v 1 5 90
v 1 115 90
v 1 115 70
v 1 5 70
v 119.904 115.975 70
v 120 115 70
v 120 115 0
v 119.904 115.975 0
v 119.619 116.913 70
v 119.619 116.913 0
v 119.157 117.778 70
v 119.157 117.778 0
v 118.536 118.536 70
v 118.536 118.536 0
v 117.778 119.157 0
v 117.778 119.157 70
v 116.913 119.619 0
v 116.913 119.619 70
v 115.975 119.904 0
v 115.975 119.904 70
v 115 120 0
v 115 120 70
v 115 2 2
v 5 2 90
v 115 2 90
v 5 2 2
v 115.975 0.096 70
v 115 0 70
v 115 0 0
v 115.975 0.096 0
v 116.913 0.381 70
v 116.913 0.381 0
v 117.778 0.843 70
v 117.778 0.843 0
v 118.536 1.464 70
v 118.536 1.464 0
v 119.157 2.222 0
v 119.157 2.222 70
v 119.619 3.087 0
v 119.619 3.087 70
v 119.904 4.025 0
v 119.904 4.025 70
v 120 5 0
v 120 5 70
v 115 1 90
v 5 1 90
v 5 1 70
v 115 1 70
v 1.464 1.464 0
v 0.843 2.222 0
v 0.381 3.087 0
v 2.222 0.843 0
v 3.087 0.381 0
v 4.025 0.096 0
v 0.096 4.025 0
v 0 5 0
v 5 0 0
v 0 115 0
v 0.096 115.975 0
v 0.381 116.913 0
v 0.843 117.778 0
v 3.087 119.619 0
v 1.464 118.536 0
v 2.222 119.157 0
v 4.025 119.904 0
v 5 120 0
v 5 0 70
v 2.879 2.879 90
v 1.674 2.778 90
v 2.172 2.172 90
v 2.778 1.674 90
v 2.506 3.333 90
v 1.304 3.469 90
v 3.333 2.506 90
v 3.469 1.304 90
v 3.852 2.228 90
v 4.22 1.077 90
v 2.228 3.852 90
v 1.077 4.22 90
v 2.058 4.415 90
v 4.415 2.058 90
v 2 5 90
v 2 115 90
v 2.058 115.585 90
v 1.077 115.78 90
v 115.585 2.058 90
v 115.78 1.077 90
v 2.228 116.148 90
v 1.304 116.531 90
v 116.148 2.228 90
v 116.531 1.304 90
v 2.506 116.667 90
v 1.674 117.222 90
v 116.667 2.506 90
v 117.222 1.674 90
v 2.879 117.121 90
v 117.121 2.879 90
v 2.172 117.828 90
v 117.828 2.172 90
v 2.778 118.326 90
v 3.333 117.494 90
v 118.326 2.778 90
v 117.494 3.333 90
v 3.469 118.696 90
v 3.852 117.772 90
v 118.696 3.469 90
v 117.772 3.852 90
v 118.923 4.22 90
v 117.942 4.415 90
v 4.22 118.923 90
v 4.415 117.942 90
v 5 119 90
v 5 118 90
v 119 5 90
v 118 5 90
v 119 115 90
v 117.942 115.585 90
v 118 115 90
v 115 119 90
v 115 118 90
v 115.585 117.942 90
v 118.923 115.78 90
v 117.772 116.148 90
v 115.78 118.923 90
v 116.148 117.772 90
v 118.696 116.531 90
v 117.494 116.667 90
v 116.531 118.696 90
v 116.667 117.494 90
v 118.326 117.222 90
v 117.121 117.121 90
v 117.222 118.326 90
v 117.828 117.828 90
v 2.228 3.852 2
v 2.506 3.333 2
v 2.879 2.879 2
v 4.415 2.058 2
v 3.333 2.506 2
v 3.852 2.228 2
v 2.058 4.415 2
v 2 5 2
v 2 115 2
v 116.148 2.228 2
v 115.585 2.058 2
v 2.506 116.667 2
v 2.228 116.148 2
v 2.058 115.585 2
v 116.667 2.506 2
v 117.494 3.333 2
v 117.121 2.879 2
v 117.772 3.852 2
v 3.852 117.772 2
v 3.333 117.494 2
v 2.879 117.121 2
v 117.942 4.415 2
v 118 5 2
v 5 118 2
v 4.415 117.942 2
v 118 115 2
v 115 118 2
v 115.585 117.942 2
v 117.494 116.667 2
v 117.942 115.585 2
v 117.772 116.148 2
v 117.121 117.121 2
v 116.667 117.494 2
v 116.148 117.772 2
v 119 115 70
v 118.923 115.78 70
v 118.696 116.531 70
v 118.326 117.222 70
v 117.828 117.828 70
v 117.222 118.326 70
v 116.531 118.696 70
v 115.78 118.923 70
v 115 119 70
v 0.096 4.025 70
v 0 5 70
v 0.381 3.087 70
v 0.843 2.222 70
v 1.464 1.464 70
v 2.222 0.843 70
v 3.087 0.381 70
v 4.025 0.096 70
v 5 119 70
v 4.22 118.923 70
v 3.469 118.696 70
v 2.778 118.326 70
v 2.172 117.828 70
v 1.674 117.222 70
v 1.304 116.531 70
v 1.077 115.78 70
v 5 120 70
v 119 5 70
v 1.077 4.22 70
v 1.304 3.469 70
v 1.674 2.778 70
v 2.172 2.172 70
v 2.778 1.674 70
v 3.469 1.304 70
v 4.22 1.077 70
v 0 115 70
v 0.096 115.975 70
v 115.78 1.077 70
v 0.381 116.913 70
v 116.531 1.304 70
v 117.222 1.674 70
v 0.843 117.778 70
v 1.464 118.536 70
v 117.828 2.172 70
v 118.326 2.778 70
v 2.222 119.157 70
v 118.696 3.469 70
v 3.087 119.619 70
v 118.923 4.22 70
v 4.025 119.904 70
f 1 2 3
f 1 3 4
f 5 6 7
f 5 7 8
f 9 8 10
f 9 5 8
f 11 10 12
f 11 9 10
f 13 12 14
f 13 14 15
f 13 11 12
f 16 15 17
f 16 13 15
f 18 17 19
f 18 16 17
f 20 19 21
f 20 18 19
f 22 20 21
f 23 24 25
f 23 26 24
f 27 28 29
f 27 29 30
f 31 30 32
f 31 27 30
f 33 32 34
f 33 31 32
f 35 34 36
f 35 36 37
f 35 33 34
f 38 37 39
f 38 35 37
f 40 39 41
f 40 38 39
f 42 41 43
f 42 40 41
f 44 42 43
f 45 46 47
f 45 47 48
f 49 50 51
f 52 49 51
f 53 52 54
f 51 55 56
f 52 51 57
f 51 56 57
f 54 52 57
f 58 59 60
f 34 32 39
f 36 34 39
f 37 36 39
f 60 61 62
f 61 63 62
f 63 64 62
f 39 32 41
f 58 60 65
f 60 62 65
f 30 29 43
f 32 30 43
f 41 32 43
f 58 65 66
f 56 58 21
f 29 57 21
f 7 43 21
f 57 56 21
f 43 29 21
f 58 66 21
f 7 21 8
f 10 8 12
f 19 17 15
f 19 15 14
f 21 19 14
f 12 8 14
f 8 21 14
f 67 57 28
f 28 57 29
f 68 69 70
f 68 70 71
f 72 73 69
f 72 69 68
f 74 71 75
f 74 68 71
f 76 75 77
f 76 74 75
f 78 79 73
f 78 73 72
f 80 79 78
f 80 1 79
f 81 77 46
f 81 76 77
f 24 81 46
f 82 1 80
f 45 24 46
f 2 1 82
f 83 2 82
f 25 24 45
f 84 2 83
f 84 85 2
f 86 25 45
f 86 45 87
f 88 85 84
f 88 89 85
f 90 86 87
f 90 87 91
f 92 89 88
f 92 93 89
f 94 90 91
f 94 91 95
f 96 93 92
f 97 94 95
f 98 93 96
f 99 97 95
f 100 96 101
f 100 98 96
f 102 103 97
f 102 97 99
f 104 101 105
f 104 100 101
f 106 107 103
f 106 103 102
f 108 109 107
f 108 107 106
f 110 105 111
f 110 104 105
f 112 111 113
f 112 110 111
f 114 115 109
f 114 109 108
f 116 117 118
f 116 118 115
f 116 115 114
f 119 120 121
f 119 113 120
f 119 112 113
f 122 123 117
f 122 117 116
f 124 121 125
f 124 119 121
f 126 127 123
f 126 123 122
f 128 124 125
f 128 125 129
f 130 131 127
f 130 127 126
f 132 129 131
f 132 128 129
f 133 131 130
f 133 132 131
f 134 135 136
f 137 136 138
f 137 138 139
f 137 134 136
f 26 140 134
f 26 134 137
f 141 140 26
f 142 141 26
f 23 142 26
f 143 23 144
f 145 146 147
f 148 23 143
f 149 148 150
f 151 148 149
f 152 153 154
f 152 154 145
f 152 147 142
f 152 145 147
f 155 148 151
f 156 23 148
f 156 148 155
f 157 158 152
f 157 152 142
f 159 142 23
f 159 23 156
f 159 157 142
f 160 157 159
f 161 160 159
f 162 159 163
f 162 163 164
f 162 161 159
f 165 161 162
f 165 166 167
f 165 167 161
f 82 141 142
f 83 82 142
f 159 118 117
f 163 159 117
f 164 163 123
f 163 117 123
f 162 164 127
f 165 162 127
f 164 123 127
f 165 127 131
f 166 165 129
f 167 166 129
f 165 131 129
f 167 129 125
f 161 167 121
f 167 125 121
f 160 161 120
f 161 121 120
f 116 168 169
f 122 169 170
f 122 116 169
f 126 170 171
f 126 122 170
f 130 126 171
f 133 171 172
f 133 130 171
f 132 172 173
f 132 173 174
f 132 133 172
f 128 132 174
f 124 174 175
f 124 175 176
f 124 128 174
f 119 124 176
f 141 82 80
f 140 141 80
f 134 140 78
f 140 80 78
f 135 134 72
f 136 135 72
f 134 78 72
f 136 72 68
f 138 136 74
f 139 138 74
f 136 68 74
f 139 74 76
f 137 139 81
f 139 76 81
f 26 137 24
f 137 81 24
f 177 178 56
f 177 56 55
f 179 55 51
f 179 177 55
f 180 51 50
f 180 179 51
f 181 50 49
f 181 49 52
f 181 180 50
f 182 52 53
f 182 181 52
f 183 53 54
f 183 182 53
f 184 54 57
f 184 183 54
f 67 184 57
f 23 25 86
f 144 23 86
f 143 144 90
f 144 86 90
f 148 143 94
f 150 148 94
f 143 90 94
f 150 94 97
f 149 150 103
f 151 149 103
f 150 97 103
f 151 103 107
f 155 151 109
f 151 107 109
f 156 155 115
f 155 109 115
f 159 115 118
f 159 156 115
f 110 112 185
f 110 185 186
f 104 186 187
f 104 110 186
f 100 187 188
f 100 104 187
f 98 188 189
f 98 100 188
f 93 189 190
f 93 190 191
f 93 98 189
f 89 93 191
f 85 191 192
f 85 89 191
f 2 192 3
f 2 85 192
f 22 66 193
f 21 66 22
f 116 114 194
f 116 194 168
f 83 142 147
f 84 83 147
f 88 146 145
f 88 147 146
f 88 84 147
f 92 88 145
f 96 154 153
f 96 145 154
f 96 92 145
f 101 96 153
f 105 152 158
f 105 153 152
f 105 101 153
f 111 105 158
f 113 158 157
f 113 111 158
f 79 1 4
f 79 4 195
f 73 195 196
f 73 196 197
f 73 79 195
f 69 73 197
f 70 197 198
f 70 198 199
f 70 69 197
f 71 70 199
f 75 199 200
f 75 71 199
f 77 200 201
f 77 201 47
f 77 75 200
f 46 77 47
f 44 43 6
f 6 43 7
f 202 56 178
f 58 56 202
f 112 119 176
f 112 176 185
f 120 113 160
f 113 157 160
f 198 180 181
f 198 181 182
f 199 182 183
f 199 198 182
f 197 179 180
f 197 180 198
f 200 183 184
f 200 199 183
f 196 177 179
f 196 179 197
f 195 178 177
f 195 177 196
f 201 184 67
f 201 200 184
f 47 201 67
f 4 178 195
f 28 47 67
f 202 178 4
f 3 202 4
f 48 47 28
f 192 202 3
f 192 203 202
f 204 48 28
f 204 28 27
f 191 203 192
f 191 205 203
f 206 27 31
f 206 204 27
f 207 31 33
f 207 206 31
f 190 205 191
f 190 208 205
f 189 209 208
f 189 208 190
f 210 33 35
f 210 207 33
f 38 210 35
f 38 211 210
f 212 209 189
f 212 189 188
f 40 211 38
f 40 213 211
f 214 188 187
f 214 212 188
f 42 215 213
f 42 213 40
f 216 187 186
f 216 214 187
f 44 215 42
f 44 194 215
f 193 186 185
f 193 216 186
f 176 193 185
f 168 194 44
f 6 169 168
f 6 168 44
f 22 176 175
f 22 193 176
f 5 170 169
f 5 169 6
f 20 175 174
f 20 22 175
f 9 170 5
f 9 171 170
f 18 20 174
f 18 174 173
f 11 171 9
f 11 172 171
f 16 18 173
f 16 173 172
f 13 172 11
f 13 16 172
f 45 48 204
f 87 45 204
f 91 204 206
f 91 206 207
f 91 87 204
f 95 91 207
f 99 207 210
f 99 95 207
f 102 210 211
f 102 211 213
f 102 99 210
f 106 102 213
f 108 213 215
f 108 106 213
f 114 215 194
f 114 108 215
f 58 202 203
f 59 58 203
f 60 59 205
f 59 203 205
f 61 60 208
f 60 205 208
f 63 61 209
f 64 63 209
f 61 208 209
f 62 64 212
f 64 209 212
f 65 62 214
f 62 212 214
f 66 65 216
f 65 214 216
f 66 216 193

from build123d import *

# Parameters (mm, degrees)
ESQUISSE1_W             = 120
ESQUISSE1_H             = 120
BOSS_EXTRU_1_DEPTH      = 90
CONG_1_R                = 5
COQUE1_T                = -2
ENL_V_MAT_EXTRU_2_DEPTH = 20


with BuildPart() as part:
    # Esquisse1 → Boss.-Extru.1 (new body)
    with BuildSketch(Plane.XY):
        with Locations((60, 60)):
            Rectangle(ESQUISSE1_W, ESQUISSE1_H)
    extrude(amount=BOSS_EXTRU_1_DEPTH)

    # Congé1
    cong_1_edges = [part.edges().sort_by_distance(p)[0] for p in [
        (0, 120, 45),
        (120, 120, 45),
        (120, 0, 45),
        (0, 0, 45),
    ]]
    fillet(cong_1_edges, radius=CONG_1_R)

    # Coque1
    coque1_openings = [part.faces().sort_by_distance(p)[0] for p in [
        (60, 60, 90),
    ]]
    offset(amount=COQUE1_T, openings=coque1_openings, kind=Kind.INTERSECTION)

    # Esquisse4 → Enlèv. mat.-Extru.2 (cut)
    with BuildSketch(Plane.XY.offset(90)):
        with BuildLine():
            Line((0, 115), (0, 5))
            ThreePointArc((0, 5), (1.464466094, 1.464466094), (5, 0))
            Line((5, 0), (115, 0))
            ThreePointArc((115, 0), (118.535533906, 1.464466094), (120, 5))
            Line((120, 5), (120, 115))
            ThreePointArc((120, 115), (118.535533906, 118.535533906), (115, 120))
            Line((115, 120), (5, 120))
            ThreePointArc((5, 120), (1.464466094, 118.535533906), (0, 115))
        make_face()
        with BuildLine():
            Line((1, 115), (1, 5))
            ThreePointArc((1, 5), (2.171572875, 2.171572875), (5, 1))
            Line((5, 1), (115, 1))
            ThreePointArc((115, 1), (117.828427125, 2.171572875), (119, 5))
            Line((119, 5), (119, 115))
            ThreePointArc((119, 115), (117.828427125, 117.828427125), (115, 119))
            Line((115, 119), (5, 119))
            ThreePointArc((5, 119), (2.171572875, 117.828427125), (1, 115))
        make_face(mode=Mode.SUBTRACT)
    extrude(amount=-ENL_V_MAT_EXTRU_2_DEPTH, mode=Mode.SUBTRACT)


solid = part.part
